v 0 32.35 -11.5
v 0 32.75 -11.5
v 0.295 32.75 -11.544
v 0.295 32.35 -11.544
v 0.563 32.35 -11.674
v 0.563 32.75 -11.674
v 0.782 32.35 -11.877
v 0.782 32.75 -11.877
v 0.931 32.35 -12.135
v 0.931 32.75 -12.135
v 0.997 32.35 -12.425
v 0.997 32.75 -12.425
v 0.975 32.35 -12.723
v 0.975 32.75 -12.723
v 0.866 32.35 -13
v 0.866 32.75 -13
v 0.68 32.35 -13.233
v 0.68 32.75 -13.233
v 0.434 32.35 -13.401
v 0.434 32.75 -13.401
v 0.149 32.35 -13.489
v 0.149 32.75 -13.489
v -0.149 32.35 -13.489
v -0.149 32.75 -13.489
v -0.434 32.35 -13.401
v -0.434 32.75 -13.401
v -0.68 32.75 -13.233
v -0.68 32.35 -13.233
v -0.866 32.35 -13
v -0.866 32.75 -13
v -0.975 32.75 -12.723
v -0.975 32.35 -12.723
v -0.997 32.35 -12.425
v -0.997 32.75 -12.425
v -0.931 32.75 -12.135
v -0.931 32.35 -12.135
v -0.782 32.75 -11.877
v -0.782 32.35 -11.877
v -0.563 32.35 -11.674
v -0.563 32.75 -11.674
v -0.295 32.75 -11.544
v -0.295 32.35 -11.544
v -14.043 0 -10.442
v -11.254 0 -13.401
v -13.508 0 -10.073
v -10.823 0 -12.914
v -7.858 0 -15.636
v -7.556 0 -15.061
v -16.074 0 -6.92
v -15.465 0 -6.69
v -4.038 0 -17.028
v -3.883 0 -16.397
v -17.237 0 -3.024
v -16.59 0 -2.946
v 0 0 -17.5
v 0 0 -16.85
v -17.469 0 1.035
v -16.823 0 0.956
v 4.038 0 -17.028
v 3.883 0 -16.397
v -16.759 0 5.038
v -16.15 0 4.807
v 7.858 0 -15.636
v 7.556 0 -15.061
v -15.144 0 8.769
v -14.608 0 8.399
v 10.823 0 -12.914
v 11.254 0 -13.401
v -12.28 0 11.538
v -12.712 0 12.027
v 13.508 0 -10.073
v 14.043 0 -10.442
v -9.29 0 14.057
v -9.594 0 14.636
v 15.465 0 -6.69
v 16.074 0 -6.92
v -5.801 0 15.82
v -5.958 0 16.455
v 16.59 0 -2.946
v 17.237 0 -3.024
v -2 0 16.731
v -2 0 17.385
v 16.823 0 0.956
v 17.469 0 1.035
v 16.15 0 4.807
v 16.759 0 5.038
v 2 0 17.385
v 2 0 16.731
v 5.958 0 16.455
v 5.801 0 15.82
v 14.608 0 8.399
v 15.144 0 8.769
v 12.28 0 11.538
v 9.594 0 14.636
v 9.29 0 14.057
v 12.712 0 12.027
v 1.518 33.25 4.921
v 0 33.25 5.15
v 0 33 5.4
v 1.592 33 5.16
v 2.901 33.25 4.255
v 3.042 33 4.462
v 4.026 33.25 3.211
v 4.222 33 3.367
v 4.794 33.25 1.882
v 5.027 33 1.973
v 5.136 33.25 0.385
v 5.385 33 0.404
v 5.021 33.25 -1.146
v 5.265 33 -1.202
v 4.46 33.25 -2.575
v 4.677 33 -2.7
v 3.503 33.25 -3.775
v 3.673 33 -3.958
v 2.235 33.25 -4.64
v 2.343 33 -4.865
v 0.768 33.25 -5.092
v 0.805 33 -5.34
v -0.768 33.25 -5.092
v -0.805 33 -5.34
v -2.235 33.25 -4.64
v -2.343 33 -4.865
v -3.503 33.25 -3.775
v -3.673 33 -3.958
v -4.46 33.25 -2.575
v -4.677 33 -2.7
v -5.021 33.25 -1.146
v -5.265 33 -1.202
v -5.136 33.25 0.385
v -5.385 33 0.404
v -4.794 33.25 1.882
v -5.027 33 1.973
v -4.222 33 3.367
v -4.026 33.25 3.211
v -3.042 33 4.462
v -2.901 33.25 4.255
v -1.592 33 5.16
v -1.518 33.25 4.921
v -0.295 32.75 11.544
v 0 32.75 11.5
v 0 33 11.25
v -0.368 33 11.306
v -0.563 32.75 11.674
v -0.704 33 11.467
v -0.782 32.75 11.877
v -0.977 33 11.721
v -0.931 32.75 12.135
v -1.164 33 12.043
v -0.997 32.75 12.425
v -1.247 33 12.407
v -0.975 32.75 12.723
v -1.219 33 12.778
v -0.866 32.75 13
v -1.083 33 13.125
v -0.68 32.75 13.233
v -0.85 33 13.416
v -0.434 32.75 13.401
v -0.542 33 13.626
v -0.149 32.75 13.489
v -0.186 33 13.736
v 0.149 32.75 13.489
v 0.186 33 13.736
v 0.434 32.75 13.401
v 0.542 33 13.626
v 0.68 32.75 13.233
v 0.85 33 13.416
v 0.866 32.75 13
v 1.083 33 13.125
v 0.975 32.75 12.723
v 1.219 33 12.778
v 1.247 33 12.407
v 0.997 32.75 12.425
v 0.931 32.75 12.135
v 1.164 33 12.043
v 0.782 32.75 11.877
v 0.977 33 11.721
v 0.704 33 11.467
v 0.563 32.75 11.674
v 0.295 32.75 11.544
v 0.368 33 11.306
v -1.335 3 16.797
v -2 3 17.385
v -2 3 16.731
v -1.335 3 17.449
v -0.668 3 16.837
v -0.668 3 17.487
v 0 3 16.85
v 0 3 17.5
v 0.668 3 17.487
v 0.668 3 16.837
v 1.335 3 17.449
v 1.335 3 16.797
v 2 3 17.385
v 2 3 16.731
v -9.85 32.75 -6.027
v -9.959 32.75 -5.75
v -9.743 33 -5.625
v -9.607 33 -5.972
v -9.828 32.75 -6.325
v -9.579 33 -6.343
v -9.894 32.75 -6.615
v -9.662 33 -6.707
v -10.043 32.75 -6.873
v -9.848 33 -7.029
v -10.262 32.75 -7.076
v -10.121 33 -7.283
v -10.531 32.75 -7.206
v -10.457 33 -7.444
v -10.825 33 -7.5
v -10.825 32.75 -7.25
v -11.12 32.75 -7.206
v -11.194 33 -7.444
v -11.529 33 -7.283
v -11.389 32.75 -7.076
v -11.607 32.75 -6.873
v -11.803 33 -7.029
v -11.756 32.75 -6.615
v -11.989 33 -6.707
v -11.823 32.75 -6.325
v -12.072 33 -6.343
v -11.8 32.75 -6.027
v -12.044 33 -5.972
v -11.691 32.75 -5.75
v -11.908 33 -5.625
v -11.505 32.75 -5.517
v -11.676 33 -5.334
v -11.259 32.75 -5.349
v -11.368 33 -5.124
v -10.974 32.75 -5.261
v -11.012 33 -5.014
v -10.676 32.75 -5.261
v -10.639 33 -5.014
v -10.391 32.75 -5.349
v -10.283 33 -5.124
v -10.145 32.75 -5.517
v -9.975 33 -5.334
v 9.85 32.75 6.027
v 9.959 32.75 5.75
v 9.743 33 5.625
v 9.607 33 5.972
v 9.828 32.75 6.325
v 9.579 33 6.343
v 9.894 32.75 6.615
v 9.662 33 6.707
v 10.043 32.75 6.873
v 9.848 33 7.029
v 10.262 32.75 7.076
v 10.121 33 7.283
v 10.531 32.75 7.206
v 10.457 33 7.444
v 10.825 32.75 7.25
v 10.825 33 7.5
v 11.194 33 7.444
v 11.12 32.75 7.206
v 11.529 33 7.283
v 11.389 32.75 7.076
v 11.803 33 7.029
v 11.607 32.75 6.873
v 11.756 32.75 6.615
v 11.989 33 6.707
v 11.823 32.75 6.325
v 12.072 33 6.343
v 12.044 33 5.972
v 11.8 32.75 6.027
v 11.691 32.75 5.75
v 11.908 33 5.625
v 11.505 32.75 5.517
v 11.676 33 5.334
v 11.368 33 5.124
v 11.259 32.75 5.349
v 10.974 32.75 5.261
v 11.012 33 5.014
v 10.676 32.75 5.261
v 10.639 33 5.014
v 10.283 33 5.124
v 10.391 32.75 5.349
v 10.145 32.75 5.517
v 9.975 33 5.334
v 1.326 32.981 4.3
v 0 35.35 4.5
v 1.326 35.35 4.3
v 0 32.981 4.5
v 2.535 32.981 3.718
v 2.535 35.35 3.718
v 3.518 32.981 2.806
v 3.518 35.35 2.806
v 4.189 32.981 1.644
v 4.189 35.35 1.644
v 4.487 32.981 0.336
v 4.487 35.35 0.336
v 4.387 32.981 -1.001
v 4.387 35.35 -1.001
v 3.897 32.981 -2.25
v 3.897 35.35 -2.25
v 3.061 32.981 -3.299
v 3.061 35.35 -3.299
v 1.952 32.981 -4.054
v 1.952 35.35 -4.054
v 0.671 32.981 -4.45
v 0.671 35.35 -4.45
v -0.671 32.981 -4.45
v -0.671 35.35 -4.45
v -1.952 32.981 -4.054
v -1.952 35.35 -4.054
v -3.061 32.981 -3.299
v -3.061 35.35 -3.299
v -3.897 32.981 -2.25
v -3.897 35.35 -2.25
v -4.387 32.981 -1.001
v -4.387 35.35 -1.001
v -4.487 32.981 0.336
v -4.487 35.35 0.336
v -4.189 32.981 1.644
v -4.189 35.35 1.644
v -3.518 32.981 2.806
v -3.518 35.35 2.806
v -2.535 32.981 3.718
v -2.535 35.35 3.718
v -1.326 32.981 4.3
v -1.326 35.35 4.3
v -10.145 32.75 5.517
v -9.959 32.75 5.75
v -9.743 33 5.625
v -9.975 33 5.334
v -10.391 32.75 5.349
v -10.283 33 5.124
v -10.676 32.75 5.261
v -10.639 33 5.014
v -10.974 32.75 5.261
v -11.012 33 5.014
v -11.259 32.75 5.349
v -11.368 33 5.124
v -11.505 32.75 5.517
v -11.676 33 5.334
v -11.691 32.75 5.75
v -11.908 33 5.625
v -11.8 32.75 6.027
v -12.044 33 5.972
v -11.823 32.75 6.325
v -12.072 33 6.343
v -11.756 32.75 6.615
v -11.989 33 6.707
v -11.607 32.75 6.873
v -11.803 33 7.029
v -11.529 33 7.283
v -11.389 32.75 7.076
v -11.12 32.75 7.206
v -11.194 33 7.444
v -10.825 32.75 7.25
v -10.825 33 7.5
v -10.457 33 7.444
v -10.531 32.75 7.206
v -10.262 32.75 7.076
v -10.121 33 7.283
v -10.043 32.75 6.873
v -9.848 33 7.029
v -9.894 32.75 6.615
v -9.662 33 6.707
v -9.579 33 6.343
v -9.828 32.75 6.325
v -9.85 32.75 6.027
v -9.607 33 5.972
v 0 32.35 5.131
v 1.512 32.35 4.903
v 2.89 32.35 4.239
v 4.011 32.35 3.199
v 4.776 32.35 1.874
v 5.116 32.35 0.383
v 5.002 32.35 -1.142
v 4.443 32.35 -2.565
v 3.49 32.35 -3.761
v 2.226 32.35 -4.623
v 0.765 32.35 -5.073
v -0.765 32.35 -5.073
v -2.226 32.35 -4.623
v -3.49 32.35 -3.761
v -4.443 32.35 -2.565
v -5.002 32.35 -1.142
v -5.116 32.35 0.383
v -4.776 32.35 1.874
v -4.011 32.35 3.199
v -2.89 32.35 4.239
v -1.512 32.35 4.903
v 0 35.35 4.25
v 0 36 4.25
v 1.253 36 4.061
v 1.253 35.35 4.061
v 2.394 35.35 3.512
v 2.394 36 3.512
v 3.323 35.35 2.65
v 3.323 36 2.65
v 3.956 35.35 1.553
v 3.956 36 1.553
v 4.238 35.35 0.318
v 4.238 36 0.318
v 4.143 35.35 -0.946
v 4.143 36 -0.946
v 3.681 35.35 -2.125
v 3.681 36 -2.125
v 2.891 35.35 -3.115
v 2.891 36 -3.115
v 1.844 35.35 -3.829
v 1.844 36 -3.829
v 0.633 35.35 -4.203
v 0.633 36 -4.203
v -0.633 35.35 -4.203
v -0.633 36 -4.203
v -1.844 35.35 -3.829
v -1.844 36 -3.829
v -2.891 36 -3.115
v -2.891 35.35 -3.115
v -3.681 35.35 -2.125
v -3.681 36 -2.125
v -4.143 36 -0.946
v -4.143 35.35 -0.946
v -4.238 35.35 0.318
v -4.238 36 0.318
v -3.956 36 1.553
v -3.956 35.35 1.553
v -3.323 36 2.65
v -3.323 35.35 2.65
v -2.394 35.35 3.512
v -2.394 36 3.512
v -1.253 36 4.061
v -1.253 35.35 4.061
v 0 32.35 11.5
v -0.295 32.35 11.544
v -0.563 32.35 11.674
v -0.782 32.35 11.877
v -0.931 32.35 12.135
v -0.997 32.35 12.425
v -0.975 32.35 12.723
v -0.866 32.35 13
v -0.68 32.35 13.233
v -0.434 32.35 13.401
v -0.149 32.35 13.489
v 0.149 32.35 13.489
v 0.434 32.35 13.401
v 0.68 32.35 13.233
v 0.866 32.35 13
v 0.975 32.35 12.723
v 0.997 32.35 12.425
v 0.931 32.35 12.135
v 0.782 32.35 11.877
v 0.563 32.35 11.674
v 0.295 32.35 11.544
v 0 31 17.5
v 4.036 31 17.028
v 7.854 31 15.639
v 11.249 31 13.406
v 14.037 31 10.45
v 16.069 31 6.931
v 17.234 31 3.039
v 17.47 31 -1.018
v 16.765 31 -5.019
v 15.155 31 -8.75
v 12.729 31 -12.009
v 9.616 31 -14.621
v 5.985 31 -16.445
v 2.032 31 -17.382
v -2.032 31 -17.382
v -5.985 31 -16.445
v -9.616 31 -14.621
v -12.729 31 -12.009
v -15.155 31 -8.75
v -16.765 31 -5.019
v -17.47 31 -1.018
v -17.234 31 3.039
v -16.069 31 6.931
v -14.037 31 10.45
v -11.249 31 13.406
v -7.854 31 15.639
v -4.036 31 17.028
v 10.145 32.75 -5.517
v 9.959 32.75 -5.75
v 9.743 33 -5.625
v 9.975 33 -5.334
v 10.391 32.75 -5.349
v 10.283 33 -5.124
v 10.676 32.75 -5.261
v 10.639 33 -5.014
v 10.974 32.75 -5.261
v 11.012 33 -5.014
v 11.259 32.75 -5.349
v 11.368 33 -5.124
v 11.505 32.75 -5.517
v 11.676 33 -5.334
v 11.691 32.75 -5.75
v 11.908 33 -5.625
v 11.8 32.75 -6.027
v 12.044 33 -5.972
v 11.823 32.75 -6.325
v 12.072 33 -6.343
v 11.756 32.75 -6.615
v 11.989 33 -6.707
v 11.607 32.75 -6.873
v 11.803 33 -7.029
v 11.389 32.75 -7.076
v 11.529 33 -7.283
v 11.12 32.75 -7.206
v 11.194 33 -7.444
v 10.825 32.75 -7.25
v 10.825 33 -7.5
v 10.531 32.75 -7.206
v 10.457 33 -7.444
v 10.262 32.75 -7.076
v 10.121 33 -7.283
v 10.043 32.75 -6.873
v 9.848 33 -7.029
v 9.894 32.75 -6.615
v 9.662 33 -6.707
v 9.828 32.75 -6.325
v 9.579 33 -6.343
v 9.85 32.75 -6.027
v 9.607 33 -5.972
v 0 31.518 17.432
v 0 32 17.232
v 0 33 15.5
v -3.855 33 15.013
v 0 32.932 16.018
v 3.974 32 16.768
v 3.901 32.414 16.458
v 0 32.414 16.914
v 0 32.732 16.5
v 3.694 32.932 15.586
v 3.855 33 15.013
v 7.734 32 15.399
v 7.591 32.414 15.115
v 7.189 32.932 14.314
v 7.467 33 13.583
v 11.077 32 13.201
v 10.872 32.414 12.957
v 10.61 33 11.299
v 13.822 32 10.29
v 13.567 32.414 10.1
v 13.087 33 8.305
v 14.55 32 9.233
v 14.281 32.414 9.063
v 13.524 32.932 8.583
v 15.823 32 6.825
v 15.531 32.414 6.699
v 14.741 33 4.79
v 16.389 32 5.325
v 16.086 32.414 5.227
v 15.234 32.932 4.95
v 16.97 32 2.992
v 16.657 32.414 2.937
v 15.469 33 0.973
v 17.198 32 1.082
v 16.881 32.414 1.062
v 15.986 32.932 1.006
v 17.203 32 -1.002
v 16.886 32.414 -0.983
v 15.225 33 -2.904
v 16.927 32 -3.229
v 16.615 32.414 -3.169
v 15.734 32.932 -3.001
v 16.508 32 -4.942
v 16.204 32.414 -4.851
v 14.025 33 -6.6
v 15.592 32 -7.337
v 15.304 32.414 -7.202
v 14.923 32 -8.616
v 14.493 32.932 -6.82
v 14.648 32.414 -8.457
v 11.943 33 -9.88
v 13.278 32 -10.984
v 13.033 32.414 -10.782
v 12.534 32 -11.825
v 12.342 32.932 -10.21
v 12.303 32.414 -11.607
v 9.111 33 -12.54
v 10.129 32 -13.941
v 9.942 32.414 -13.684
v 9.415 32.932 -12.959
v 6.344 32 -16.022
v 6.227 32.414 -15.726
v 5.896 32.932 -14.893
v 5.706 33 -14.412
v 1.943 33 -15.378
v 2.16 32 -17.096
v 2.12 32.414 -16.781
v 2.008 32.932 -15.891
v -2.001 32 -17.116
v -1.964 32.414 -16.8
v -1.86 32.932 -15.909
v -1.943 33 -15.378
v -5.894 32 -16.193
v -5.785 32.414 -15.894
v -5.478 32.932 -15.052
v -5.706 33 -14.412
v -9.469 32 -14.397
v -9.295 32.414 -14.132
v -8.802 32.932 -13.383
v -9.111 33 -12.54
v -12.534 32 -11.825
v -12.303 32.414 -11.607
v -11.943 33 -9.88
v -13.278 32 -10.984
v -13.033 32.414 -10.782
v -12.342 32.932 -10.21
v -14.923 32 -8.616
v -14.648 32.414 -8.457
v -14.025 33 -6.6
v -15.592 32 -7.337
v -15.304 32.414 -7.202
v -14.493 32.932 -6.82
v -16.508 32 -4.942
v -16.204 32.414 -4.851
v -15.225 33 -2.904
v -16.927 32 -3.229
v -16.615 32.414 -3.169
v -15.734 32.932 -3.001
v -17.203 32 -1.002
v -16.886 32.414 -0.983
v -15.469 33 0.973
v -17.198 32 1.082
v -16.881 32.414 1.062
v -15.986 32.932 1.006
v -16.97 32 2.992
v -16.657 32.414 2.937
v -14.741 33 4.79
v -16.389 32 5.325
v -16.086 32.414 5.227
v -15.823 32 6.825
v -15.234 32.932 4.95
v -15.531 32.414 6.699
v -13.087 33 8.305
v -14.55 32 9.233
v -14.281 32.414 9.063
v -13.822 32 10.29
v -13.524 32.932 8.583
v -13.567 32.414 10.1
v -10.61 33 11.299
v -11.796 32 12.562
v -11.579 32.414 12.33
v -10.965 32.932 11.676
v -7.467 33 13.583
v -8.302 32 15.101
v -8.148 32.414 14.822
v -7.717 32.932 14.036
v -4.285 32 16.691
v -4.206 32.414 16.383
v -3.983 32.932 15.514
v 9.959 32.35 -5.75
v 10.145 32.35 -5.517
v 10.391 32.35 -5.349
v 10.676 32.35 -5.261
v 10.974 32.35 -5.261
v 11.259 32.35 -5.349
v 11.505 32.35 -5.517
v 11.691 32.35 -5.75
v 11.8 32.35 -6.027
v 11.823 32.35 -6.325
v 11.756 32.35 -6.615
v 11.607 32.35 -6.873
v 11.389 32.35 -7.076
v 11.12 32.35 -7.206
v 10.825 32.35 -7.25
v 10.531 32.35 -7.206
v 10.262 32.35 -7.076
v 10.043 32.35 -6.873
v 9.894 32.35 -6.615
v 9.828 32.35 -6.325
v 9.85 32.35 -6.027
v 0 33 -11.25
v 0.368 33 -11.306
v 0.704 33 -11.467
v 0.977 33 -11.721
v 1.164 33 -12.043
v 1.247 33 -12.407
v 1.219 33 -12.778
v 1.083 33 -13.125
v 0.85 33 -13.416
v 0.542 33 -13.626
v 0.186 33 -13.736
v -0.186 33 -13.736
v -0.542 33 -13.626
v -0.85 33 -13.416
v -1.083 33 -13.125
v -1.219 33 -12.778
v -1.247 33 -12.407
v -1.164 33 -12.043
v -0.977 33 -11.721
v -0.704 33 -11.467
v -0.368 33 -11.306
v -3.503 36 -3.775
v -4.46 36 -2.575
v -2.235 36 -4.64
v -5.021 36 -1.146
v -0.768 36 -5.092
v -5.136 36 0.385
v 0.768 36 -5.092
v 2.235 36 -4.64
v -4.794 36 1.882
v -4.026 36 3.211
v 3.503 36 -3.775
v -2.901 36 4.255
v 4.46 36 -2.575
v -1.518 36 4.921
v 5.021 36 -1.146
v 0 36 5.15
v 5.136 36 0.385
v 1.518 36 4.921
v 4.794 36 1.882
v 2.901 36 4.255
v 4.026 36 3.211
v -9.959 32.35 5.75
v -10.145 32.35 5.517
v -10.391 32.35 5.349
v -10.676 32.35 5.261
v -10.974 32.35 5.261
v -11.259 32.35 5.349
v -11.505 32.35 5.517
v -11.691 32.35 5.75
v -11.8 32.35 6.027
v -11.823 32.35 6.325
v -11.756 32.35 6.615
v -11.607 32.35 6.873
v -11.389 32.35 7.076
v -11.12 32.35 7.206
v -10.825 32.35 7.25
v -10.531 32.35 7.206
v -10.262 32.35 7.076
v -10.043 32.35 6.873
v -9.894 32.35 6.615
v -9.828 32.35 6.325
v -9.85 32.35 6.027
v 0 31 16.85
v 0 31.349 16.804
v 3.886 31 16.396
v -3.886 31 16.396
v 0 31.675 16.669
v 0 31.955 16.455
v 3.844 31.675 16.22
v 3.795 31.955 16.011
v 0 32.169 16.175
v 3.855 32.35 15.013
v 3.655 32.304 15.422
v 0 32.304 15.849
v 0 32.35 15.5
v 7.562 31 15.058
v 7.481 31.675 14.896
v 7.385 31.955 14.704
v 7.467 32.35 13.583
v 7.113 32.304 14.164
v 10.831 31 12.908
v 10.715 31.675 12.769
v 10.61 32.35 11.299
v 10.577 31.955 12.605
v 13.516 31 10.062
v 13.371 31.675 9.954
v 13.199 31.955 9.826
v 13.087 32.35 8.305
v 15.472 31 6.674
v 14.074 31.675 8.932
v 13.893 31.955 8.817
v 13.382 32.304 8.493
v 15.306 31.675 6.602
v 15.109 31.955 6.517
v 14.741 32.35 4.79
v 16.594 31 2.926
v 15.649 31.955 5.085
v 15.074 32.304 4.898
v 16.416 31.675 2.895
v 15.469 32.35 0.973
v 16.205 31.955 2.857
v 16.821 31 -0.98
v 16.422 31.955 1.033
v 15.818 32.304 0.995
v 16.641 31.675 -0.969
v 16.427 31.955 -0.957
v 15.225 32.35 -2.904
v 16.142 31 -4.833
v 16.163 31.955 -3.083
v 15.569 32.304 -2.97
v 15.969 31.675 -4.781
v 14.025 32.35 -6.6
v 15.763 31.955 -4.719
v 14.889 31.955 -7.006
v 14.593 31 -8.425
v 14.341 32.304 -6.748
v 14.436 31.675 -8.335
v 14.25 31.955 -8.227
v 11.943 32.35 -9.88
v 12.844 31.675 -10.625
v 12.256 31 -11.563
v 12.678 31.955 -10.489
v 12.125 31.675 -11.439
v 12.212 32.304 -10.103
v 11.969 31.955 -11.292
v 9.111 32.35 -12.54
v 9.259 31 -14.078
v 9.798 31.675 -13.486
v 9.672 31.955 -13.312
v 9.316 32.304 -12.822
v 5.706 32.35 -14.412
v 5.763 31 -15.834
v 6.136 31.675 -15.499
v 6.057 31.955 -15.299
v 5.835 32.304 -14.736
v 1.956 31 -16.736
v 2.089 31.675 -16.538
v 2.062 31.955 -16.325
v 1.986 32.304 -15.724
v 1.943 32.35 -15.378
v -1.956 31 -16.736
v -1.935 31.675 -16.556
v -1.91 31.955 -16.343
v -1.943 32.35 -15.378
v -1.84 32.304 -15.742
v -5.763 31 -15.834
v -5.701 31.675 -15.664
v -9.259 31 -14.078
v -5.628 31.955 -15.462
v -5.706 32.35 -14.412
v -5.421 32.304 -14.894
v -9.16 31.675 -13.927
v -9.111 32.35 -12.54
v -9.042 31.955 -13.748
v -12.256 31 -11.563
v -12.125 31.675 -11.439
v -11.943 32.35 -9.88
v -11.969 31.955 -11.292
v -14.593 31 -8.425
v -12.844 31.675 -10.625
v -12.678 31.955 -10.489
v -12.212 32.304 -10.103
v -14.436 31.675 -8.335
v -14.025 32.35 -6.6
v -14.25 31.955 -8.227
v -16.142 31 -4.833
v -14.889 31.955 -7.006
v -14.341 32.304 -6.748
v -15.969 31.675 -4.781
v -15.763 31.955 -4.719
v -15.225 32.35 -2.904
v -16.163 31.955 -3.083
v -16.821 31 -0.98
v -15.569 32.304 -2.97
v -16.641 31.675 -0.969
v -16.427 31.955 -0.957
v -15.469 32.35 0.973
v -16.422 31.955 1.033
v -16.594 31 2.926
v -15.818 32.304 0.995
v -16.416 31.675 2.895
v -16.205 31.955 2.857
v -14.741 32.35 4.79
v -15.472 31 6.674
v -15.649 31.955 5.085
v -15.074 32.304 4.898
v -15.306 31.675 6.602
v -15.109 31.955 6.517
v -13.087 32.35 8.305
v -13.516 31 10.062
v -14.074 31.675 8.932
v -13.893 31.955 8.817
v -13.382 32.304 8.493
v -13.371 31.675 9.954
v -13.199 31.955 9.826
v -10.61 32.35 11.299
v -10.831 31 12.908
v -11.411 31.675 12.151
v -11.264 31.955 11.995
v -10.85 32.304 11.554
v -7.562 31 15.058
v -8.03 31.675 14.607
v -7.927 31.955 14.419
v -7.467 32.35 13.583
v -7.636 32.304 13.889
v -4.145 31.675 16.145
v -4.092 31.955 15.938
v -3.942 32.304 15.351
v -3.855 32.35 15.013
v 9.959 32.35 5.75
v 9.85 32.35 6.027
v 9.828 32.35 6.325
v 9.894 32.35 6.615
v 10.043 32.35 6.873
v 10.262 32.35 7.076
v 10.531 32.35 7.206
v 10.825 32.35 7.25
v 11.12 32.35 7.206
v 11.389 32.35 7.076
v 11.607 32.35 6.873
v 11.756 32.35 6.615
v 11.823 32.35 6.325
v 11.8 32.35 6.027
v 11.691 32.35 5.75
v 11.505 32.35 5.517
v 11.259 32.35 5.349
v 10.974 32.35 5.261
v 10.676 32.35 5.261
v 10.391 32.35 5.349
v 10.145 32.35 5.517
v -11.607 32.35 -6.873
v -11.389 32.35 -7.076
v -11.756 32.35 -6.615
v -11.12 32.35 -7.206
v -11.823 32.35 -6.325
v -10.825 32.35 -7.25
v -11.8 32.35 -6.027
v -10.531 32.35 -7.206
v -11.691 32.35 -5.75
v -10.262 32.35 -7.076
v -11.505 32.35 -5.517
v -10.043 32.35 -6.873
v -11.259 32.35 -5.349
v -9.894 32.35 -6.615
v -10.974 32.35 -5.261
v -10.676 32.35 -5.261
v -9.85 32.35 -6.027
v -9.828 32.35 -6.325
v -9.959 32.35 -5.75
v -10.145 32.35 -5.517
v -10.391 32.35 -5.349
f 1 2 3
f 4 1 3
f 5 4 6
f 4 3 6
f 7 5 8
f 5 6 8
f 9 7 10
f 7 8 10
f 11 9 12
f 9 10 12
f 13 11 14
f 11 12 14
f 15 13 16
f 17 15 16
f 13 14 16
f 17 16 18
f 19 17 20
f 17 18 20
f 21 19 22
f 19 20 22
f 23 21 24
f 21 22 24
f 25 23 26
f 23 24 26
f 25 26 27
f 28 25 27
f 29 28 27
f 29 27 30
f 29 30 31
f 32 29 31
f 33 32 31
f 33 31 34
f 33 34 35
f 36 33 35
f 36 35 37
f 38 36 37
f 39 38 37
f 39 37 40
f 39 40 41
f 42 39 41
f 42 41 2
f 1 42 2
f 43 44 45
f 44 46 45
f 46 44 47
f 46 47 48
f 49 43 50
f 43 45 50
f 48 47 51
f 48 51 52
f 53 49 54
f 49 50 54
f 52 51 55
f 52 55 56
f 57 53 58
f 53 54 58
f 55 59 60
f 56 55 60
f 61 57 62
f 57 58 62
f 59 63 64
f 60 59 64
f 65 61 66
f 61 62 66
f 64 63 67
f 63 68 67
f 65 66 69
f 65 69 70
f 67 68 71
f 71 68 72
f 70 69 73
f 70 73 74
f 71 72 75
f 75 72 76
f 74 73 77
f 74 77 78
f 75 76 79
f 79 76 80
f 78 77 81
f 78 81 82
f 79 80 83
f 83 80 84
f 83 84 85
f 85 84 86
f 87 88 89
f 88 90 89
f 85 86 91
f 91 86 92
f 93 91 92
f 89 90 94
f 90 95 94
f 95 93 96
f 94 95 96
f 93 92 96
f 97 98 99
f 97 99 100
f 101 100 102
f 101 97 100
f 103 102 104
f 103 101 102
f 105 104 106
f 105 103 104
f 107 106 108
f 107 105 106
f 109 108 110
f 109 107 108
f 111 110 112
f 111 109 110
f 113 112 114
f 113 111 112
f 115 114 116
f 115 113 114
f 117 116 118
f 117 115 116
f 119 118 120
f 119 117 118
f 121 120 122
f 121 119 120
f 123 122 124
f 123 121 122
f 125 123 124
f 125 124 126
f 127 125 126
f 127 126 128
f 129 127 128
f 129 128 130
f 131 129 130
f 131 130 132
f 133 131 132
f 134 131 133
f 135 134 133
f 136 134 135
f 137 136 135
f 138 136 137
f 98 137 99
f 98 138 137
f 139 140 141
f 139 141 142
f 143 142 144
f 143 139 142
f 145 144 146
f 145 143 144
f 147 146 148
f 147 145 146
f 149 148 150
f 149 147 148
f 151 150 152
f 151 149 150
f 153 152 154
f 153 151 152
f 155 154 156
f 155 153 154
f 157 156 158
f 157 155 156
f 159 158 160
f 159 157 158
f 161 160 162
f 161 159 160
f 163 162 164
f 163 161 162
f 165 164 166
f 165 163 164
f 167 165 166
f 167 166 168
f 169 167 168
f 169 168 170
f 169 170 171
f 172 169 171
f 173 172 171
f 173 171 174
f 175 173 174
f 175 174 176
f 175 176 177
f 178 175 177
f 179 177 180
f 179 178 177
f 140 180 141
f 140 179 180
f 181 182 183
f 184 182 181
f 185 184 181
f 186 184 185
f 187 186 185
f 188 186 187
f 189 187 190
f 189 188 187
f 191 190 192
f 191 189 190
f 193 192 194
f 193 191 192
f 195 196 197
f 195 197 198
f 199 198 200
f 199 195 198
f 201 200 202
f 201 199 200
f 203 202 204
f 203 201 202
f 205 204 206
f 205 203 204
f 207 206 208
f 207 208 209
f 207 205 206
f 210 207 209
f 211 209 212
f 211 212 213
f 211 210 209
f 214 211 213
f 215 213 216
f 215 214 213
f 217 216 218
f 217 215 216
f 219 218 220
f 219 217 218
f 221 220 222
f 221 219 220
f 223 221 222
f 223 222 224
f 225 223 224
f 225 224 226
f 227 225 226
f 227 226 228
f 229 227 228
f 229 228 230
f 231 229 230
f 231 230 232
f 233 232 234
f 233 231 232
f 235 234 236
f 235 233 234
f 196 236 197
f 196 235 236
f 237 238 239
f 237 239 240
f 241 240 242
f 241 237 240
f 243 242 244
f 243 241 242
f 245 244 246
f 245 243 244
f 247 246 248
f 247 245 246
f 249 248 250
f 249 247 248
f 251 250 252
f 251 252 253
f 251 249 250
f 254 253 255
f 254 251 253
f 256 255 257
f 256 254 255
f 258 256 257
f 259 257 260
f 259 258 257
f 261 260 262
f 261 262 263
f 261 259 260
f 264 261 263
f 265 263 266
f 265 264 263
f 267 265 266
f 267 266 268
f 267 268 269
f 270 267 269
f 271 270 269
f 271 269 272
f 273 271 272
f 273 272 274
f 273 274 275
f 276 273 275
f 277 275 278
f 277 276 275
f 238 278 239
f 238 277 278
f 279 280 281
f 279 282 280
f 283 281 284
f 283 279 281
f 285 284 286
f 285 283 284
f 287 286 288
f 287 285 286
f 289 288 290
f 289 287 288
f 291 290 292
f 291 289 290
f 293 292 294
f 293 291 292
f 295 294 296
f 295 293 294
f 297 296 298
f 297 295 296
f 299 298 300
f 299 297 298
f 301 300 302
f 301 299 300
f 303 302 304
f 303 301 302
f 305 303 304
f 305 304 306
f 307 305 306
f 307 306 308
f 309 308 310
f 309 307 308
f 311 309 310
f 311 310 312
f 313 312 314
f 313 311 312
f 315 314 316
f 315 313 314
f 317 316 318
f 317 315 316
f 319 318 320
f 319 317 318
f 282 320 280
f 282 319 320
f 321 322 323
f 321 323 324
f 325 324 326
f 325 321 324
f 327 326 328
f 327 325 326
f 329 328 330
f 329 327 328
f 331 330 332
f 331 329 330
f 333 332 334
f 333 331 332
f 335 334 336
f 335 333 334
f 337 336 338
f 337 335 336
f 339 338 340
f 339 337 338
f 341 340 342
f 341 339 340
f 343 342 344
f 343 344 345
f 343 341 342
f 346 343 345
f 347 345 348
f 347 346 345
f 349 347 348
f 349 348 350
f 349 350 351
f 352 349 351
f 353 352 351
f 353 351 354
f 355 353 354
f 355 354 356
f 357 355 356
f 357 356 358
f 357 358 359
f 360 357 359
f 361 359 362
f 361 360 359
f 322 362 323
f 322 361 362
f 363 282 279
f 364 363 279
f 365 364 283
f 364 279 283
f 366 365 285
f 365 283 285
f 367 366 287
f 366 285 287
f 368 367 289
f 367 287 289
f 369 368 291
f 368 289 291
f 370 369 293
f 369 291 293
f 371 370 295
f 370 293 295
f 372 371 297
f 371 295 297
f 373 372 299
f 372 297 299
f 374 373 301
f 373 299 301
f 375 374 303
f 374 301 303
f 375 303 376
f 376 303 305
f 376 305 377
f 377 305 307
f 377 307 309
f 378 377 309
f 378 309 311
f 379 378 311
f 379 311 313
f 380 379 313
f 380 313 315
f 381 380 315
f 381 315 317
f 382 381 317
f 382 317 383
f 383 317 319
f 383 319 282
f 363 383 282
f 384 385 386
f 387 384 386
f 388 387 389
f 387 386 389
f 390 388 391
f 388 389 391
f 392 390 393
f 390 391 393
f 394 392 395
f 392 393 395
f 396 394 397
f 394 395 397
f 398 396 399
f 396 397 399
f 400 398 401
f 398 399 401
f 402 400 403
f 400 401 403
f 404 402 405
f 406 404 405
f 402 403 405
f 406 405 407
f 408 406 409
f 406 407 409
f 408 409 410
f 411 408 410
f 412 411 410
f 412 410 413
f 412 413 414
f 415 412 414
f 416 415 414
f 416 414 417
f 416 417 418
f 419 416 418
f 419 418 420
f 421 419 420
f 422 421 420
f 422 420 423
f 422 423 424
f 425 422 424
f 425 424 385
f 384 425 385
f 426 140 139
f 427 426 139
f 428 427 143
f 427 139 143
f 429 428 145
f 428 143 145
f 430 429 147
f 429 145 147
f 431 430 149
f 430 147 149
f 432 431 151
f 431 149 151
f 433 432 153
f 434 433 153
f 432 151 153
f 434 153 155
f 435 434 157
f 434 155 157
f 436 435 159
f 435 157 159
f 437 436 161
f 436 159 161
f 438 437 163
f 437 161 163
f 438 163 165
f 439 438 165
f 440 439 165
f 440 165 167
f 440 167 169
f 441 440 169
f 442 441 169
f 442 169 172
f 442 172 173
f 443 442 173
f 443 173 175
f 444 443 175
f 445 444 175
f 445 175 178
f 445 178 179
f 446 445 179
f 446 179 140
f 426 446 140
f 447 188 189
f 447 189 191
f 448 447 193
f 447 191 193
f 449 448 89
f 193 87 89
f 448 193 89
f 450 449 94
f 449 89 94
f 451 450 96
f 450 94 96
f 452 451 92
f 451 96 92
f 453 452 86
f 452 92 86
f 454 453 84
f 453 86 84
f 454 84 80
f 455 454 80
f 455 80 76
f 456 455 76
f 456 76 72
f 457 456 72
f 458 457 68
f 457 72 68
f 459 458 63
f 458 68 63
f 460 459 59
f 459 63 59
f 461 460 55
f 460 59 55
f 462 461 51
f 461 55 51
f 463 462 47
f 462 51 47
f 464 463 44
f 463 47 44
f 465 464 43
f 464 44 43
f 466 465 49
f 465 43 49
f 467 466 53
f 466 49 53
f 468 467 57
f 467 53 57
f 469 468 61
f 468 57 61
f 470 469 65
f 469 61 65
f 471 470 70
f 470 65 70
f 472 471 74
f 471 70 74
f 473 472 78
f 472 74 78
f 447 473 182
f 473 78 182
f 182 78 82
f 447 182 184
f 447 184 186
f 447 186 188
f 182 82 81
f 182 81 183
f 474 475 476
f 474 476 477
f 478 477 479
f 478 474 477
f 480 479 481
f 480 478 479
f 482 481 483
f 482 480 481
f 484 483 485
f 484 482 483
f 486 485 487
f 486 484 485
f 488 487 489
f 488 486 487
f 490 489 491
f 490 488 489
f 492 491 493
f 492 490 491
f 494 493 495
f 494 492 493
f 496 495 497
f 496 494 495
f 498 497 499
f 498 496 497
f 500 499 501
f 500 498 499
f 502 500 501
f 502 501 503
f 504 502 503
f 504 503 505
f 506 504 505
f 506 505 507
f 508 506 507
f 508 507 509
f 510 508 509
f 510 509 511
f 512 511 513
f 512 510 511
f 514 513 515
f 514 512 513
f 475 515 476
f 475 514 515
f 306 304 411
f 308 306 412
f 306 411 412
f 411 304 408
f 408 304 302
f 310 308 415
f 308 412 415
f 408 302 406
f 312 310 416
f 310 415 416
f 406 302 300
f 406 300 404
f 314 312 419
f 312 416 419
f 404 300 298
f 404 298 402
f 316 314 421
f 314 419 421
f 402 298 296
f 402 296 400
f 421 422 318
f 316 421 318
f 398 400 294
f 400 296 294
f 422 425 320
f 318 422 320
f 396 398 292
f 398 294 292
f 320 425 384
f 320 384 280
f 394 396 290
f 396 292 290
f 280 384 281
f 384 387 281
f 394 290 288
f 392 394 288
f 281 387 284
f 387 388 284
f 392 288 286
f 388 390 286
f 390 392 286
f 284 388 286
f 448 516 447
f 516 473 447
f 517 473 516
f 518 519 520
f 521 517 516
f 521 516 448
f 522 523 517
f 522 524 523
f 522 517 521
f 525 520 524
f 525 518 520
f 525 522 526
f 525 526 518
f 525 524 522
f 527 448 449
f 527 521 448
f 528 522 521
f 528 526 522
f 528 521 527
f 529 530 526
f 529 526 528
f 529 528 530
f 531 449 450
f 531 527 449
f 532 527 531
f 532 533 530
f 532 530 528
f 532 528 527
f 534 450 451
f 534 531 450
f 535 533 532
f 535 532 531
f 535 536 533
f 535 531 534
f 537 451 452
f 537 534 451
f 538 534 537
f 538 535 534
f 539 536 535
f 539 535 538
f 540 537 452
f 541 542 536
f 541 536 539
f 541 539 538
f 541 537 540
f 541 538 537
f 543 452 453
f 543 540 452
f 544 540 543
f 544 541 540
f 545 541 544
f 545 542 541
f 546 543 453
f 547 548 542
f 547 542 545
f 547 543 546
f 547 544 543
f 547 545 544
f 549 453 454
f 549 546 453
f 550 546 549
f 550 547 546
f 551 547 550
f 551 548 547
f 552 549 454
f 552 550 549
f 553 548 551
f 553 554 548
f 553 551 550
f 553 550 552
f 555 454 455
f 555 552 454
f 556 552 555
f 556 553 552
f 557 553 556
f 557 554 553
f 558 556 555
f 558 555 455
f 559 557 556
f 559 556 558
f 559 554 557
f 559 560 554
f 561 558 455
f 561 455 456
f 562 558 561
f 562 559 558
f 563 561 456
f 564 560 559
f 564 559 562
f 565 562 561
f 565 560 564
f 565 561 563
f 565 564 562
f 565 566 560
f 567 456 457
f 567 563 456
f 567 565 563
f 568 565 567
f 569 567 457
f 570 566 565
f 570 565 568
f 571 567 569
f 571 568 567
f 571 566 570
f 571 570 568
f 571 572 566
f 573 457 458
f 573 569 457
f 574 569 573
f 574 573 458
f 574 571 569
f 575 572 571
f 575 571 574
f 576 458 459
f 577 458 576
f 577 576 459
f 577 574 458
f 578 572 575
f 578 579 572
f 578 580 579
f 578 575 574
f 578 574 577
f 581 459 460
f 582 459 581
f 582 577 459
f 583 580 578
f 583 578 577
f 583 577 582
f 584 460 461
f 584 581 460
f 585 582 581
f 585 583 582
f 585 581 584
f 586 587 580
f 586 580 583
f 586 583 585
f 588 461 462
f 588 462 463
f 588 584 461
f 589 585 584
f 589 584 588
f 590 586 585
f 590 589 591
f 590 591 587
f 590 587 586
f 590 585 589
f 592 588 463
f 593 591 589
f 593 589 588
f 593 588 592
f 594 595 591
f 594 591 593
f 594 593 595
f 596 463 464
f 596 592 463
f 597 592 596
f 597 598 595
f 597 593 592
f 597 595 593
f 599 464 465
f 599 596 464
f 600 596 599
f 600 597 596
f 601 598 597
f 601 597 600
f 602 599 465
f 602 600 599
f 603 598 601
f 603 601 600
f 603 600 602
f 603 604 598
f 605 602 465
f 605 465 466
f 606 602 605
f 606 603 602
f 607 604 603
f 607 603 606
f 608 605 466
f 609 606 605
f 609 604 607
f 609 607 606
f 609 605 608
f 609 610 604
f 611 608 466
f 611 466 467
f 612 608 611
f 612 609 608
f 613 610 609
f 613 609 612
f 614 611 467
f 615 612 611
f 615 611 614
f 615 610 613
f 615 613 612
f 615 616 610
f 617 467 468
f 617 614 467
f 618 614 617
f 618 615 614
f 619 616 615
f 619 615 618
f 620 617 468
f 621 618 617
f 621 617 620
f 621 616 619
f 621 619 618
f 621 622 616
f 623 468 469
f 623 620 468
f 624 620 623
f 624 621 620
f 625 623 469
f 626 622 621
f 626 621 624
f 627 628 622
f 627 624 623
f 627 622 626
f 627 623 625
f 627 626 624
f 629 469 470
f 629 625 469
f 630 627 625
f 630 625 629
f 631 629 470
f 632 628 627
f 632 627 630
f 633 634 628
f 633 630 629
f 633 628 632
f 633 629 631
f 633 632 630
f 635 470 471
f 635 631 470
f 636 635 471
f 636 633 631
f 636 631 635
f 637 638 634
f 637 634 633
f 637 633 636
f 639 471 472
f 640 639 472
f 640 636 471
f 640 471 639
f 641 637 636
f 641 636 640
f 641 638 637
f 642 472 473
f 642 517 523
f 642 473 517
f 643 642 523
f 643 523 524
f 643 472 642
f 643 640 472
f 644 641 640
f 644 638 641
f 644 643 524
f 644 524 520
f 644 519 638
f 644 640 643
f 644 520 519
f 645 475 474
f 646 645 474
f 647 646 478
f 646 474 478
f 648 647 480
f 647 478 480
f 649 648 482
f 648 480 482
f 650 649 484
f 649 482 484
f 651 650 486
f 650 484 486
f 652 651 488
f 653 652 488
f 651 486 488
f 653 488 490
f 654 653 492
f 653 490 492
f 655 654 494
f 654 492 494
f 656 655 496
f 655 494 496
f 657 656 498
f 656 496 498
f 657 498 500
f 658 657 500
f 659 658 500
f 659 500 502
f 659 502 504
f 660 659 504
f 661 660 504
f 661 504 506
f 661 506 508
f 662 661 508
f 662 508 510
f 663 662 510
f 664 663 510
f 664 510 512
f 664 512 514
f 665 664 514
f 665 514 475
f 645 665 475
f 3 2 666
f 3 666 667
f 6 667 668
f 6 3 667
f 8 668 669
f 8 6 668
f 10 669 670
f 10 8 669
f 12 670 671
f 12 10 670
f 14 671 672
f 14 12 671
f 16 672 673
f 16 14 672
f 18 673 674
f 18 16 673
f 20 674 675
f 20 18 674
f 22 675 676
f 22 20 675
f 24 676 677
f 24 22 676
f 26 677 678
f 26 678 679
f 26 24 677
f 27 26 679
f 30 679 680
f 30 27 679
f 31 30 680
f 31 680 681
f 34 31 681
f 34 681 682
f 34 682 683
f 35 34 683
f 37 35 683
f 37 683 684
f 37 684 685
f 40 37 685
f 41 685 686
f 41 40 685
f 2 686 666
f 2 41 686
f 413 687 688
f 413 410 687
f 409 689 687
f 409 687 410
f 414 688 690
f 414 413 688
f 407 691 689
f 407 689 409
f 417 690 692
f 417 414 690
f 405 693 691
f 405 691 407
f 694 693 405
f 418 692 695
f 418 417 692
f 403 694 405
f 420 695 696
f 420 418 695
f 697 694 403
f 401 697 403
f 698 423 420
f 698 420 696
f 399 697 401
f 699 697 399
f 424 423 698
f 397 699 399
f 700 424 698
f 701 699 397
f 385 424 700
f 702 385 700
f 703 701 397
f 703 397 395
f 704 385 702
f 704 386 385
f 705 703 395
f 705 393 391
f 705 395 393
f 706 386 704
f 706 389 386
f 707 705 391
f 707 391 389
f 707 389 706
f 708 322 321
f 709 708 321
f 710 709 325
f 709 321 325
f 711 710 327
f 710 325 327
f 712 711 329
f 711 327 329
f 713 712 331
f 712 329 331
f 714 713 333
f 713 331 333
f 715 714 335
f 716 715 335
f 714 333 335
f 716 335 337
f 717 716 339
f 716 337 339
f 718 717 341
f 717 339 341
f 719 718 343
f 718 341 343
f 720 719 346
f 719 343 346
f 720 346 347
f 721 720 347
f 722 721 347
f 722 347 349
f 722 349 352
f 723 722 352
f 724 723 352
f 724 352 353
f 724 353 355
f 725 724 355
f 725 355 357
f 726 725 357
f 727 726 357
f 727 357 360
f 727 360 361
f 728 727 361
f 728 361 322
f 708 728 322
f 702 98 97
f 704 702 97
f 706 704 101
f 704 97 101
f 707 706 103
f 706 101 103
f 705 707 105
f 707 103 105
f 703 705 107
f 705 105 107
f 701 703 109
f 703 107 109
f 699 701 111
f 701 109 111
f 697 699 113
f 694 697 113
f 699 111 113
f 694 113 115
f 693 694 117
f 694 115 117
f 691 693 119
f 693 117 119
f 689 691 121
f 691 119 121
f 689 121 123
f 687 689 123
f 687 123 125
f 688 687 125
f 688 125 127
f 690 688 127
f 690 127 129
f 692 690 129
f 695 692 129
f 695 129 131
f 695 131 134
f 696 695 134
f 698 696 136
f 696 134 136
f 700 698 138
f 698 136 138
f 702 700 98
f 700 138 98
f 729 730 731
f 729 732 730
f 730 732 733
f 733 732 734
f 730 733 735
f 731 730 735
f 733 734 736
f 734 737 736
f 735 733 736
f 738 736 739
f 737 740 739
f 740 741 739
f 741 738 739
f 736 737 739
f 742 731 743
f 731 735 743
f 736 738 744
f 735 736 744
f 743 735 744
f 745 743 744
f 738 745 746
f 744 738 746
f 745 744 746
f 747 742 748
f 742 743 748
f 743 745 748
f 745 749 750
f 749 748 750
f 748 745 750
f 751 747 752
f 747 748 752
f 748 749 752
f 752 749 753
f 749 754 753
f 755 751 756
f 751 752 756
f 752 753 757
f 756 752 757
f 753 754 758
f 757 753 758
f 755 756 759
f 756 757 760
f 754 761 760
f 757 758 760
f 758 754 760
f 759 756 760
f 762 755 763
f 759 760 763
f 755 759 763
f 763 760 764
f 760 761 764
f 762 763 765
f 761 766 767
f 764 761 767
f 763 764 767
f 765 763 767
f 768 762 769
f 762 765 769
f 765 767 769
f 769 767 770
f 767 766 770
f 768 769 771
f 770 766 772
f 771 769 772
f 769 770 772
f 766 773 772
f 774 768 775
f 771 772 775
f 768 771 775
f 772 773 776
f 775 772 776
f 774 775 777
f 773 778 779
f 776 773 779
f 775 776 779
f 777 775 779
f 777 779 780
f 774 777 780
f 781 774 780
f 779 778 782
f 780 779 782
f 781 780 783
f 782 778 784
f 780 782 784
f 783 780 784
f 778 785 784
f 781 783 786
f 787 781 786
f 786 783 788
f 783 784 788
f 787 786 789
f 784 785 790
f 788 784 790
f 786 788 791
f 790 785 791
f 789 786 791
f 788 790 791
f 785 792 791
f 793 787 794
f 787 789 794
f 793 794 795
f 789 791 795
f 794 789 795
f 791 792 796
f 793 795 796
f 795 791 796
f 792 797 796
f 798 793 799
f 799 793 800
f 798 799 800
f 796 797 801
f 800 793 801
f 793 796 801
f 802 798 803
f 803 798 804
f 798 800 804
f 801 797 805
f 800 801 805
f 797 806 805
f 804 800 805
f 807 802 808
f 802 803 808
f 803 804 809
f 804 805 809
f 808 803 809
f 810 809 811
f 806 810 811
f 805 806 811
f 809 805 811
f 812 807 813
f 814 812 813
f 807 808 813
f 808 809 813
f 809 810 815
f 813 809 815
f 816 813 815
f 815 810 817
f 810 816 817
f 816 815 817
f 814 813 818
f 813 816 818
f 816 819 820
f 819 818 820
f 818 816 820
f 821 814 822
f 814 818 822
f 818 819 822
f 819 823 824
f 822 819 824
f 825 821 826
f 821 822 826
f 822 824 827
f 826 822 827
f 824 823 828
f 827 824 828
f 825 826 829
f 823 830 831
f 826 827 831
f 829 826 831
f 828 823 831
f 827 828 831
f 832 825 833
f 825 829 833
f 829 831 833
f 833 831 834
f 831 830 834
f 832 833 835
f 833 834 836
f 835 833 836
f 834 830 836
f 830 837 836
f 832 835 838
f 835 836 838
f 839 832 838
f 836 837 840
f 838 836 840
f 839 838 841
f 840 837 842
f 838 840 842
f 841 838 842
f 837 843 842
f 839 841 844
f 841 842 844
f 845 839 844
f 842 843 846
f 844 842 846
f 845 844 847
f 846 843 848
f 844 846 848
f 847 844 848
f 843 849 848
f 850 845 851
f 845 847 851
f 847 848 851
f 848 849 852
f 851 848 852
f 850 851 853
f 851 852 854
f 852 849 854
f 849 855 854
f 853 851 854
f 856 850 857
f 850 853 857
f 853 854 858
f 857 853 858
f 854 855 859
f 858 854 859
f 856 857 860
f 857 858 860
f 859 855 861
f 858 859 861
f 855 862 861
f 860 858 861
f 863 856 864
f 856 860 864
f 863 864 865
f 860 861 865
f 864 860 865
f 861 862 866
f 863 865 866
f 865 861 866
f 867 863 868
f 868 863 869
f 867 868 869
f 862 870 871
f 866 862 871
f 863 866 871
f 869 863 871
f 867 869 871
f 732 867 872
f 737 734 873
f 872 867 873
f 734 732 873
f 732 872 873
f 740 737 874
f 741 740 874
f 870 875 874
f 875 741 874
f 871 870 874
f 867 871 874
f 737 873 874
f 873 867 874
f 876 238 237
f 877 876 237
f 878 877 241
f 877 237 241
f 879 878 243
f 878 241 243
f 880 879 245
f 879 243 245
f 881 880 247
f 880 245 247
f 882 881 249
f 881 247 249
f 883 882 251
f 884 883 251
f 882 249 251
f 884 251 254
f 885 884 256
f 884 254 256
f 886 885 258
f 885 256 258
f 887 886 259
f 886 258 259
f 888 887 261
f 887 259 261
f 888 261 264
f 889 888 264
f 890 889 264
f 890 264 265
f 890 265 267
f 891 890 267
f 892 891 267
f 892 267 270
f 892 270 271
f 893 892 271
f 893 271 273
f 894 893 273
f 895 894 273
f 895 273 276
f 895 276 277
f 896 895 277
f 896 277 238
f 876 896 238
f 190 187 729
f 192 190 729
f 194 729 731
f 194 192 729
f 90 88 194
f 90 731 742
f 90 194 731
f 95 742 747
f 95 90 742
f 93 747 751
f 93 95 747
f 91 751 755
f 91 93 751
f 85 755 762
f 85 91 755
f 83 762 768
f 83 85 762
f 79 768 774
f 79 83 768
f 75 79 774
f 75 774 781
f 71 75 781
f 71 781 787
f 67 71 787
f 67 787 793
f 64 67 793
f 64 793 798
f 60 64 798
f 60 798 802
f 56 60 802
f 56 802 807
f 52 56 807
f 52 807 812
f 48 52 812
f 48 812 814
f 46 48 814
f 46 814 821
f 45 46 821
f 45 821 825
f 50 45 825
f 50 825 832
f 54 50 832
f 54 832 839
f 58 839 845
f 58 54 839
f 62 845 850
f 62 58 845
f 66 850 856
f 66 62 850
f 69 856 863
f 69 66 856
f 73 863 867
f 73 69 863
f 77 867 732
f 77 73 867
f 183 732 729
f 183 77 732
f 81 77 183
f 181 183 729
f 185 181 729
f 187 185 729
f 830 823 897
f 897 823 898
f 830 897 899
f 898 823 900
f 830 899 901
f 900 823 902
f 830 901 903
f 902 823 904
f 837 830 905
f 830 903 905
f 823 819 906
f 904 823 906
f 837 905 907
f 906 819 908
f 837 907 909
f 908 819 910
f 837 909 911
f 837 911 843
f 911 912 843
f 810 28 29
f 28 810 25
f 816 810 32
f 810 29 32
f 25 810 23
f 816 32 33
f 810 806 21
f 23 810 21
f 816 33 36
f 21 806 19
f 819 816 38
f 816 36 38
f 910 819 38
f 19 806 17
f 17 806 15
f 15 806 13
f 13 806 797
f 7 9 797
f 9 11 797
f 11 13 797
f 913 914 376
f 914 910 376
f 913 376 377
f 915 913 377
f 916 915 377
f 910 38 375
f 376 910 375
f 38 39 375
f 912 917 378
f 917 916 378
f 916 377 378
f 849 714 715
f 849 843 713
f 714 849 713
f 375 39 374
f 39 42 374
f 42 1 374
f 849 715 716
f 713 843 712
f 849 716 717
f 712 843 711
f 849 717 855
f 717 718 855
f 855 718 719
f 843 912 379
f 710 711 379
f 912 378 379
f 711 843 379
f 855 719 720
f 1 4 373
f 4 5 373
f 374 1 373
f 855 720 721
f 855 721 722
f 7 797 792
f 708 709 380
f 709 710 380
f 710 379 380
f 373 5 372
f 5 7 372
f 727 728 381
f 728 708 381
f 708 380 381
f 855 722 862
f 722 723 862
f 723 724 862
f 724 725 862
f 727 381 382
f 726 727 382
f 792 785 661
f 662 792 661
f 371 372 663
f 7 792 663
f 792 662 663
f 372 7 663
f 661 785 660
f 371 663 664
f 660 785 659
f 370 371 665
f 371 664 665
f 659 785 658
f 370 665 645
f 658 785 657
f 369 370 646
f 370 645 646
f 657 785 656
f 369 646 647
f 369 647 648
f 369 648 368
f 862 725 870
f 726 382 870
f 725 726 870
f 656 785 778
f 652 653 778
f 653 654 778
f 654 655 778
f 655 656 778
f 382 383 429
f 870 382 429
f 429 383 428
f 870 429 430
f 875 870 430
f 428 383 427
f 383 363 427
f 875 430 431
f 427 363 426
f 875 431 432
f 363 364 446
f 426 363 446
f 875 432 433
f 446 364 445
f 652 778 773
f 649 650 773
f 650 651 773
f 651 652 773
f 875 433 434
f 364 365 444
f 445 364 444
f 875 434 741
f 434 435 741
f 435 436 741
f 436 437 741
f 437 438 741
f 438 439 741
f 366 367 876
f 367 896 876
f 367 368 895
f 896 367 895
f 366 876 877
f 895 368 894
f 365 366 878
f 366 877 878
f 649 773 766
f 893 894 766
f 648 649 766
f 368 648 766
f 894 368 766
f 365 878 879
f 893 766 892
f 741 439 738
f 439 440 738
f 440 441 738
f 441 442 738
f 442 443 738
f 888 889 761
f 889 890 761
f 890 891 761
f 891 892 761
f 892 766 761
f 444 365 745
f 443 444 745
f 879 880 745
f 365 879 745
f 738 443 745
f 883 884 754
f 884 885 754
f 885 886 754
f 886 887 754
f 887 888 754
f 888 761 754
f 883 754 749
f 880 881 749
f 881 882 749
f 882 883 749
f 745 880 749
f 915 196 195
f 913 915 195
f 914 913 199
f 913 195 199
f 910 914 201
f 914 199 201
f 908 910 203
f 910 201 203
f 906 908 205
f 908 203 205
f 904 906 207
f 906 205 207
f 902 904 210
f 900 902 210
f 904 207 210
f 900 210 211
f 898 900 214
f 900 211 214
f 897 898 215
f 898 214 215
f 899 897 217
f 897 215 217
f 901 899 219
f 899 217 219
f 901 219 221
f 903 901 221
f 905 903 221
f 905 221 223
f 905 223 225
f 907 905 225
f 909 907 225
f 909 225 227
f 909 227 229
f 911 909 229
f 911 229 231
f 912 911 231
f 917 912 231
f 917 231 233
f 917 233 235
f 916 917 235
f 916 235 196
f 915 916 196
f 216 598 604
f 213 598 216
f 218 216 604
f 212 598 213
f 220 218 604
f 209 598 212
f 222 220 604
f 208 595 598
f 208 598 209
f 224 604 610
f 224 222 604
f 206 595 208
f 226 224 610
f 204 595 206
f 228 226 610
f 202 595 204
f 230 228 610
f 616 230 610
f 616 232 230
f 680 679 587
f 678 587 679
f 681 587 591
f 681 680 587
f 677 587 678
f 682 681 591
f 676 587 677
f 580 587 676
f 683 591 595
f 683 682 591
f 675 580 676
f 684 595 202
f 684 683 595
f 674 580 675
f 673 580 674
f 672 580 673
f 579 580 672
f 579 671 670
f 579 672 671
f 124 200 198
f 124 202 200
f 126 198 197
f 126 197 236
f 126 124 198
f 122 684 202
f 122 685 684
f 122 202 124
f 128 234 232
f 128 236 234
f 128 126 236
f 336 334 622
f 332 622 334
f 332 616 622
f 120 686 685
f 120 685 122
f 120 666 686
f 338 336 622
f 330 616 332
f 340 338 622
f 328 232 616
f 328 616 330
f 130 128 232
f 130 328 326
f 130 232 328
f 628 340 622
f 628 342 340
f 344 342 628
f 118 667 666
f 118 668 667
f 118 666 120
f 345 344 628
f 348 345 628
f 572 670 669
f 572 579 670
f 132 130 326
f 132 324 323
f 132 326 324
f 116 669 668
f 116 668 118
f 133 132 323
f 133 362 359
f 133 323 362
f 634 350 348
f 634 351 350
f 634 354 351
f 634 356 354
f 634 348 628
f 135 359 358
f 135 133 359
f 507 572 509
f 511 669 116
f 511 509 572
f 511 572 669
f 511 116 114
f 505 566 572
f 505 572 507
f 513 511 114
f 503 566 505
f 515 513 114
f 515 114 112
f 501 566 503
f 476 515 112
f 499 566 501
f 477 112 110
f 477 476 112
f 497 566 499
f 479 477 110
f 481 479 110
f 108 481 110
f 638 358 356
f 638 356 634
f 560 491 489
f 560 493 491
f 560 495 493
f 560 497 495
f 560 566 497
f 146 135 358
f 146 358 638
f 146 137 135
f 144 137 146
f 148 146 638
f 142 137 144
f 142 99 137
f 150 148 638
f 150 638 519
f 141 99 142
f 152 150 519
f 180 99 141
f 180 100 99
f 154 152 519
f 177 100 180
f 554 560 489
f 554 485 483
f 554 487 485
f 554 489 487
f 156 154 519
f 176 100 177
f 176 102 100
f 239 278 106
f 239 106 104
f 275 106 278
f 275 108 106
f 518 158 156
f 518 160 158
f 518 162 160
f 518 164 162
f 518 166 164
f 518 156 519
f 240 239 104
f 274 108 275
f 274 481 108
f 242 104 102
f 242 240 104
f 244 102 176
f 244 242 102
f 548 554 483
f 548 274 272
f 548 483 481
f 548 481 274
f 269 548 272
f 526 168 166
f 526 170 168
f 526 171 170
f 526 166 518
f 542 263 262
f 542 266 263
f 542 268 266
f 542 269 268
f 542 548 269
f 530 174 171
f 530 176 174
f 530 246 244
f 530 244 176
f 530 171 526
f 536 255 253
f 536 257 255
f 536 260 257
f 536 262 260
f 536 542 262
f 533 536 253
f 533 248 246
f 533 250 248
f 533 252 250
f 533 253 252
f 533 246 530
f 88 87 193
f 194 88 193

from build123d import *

# Parameters (mm, degrees)
SKETCH1_R                    = 17.5
BOSS_EXTRUDE1_DEPTH          = 33
FILLET1_R                    = 2
SKETCH3_R                    = 5.15
BOSS_EXTRUDE2_DEPTH          = 3
CHAMFER1_SIZE                = 0.25
SHELL1_T                     = -0.65
CUT_EXTRUDE1_REACH           = 45.686
SKETCH4_R                    = 4.25
CUT_EXTRUDE2_REACH           = 43.249
SKETCH5_R                    = 1
CHAMFER2_SIZE                = 0.25
CIRPATTERN1_COUNT            = 6
CHAMFER2_OF_CIRPATTERN1_SIZE = 0.25
CUT_EXTRUDE3_REACH           = 55.172
CUT_EXTRUDE3_END_RADIUS      = 16.85
SKETCH6_W                    = 4
SKETCH6_H                    = 6


with BuildPart() as part:
    # Sketch1 → Boss-Extrude1 (new body)
    with BuildSketch(Plane(origin=(0, 0, 0), x_dir=(1, 0, 0), z_dir=(0, 1, 0))):
        with Locations(Location((0, 0, 0), (0, 0, 270))):
            Circle(SKETCH1_R)
    extrude(amount=BOSS_EXTRUDE1_DEPTH)

    # Fillet1
    fillet1_edges = [part.edges().sort_by_distance(p)[0] for p in [
        (0, 33, -17.5),
    ]]
    fillet(fillet1_edges, radius=FILLET1_R)

    # Sketch3 → Boss-Extrude2 (add)
    with BuildSketch(Plane(origin=(0, 33, 0), x_dir=(1, 0, 0), z_dir=(0, 1, 0))):
        with Locations(Location((0, 0, 0), (0, 0, 270))):
            Circle(SKETCH3_R)
    extrude(amount=BOSS_EXTRUDE2_DEPTH)

    # Chamfer1
    chamfer1_edges = [part.edges().sort_by_distance(p)[0] for p in [
        (0, 33, -5.15),
    ]]
    chamfer(chamfer1_edges, length=CHAMFER1_SIZE)

    # Shell1
    shell1_openings = [part.faces().sort_by_distance(p)[0] for p in [
        (0, 0, 0),
    ]]
    offset(amount=SHELL1_T, openings=shell1_openings, kind=Kind.INTERSECTION)

    # Sketch4 → Cut-Extrude1 (cut, up to next)
    with BuildSketch(Plane(origin=(0, 36, 0), x_dir=(1, 0, 0), z_dir=(0, 1, 0)), mode=Mode.PRIVATE) as cut_extrude1_sk1:
        with Locations(Location((0, 0, 0), (0, 0, 270))):
            Circle(SKETCH4_R)
    cut_extrude1_tool1 = extrude(cut_extrude1_sk1.sketch, amount=-CUT_EXTRUDE1_REACH, mode=Mode.PRIVATE) & part.part
    add(cut_extrude1_tool1.solids().sort_by_distance((0, 36, 0))[0], mode=Mode.SUBTRACT)

    # Sketch5 → Cut-Extrude2 (cut, up to next)
    with BuildSketch(Plane(origin=(0, 33, 0), x_dir=(1, 0, 0), z_dir=(0, 1, 0)), mode=Mode.PRIVATE) as cut_extrude2_sk1:
        with Locations(Location((0, 12.5, 0), (0, 0, 270))):
            Circle(SKETCH5_R)
    cut_extrude2_tool1 = extrude(cut_extrude2_sk1.sketch, amount=-CUT_EXTRUDE2_REACH, mode=Mode.PRIVATE) & part.part
    cut_extrude2 = cut_extrude2_tool1.solids().sort_by_distance((0, 33, -12.5))[0]
    add(cut_extrude2, mode=Mode.SUBTRACT)

    # Chamfer2
    chamfer2_edges = [part.edges().sort_by_distance(p)[0] for p in [
        (0, 33, -13.5),
    ]]
    chamfer(chamfer2_edges, length=CHAMFER2_SIZE)

    # CirPattern1: Cut-Extrude2 ×6 about axis
    cirpattern1_axis = Axis((0, 0, 0), (0, 1, 0))
    for i in range(1, CIRPATTERN1_COUNT):
        add(cut_extrude2.rotate(cirpattern1_axis, i * 360 / CIRPATTERN1_COUNT), mode=Mode.SUBTRACT)

    # Chamfer2 of CirPattern1
    chamfer2_of_cirpattern1_edges = [part.edges().sort_by_distance(p)[0] for p in [
        (-11.691342951, 33, -6.75),
        (-11.691342951, 33, 6.75),
        (0, 33, 13.5),
        (11.691342951, 33, 6.75),
        (11.691342951, 33, -6.75),
    ]]
    chamfer(chamfer2_of_cirpattern1_edges, length=CHAMFER2_OF_CIRPATTERN1_SIZE)

    # Cut-Extrude3: up to this cylinder (the profile starts outside it)
    cut_extrude3_end = Plane(origin=(0, 0, 0), z_dir=(0, -1, 0)) * Cylinder(CUT_EXTRUDE3_END_RADIUS, 145.044, mode=Mode.PRIVATE)
    # Sketch6 → Cut-Extrude3 (cut, up to the surface)
    with BuildSketch(Plane.XY.offset(17.5), mode=Mode.PRIVATE) as cut_extrude3_sk1:
        Rectangle(SKETCH6_W, SKETCH6_H)
    cut_extrude3_tool1 = extrude(cut_extrude3_sk1.sketch, amount=-CUT_EXTRUDE3_REACH, mode=Mode.PRIVATE) - cut_extrude3_end
    add(cut_extrude3_tool1.solids().sort_by_distance((0, 0, 17.5))[0], mode=Mode.SUBTRACT)


solid = part.part
